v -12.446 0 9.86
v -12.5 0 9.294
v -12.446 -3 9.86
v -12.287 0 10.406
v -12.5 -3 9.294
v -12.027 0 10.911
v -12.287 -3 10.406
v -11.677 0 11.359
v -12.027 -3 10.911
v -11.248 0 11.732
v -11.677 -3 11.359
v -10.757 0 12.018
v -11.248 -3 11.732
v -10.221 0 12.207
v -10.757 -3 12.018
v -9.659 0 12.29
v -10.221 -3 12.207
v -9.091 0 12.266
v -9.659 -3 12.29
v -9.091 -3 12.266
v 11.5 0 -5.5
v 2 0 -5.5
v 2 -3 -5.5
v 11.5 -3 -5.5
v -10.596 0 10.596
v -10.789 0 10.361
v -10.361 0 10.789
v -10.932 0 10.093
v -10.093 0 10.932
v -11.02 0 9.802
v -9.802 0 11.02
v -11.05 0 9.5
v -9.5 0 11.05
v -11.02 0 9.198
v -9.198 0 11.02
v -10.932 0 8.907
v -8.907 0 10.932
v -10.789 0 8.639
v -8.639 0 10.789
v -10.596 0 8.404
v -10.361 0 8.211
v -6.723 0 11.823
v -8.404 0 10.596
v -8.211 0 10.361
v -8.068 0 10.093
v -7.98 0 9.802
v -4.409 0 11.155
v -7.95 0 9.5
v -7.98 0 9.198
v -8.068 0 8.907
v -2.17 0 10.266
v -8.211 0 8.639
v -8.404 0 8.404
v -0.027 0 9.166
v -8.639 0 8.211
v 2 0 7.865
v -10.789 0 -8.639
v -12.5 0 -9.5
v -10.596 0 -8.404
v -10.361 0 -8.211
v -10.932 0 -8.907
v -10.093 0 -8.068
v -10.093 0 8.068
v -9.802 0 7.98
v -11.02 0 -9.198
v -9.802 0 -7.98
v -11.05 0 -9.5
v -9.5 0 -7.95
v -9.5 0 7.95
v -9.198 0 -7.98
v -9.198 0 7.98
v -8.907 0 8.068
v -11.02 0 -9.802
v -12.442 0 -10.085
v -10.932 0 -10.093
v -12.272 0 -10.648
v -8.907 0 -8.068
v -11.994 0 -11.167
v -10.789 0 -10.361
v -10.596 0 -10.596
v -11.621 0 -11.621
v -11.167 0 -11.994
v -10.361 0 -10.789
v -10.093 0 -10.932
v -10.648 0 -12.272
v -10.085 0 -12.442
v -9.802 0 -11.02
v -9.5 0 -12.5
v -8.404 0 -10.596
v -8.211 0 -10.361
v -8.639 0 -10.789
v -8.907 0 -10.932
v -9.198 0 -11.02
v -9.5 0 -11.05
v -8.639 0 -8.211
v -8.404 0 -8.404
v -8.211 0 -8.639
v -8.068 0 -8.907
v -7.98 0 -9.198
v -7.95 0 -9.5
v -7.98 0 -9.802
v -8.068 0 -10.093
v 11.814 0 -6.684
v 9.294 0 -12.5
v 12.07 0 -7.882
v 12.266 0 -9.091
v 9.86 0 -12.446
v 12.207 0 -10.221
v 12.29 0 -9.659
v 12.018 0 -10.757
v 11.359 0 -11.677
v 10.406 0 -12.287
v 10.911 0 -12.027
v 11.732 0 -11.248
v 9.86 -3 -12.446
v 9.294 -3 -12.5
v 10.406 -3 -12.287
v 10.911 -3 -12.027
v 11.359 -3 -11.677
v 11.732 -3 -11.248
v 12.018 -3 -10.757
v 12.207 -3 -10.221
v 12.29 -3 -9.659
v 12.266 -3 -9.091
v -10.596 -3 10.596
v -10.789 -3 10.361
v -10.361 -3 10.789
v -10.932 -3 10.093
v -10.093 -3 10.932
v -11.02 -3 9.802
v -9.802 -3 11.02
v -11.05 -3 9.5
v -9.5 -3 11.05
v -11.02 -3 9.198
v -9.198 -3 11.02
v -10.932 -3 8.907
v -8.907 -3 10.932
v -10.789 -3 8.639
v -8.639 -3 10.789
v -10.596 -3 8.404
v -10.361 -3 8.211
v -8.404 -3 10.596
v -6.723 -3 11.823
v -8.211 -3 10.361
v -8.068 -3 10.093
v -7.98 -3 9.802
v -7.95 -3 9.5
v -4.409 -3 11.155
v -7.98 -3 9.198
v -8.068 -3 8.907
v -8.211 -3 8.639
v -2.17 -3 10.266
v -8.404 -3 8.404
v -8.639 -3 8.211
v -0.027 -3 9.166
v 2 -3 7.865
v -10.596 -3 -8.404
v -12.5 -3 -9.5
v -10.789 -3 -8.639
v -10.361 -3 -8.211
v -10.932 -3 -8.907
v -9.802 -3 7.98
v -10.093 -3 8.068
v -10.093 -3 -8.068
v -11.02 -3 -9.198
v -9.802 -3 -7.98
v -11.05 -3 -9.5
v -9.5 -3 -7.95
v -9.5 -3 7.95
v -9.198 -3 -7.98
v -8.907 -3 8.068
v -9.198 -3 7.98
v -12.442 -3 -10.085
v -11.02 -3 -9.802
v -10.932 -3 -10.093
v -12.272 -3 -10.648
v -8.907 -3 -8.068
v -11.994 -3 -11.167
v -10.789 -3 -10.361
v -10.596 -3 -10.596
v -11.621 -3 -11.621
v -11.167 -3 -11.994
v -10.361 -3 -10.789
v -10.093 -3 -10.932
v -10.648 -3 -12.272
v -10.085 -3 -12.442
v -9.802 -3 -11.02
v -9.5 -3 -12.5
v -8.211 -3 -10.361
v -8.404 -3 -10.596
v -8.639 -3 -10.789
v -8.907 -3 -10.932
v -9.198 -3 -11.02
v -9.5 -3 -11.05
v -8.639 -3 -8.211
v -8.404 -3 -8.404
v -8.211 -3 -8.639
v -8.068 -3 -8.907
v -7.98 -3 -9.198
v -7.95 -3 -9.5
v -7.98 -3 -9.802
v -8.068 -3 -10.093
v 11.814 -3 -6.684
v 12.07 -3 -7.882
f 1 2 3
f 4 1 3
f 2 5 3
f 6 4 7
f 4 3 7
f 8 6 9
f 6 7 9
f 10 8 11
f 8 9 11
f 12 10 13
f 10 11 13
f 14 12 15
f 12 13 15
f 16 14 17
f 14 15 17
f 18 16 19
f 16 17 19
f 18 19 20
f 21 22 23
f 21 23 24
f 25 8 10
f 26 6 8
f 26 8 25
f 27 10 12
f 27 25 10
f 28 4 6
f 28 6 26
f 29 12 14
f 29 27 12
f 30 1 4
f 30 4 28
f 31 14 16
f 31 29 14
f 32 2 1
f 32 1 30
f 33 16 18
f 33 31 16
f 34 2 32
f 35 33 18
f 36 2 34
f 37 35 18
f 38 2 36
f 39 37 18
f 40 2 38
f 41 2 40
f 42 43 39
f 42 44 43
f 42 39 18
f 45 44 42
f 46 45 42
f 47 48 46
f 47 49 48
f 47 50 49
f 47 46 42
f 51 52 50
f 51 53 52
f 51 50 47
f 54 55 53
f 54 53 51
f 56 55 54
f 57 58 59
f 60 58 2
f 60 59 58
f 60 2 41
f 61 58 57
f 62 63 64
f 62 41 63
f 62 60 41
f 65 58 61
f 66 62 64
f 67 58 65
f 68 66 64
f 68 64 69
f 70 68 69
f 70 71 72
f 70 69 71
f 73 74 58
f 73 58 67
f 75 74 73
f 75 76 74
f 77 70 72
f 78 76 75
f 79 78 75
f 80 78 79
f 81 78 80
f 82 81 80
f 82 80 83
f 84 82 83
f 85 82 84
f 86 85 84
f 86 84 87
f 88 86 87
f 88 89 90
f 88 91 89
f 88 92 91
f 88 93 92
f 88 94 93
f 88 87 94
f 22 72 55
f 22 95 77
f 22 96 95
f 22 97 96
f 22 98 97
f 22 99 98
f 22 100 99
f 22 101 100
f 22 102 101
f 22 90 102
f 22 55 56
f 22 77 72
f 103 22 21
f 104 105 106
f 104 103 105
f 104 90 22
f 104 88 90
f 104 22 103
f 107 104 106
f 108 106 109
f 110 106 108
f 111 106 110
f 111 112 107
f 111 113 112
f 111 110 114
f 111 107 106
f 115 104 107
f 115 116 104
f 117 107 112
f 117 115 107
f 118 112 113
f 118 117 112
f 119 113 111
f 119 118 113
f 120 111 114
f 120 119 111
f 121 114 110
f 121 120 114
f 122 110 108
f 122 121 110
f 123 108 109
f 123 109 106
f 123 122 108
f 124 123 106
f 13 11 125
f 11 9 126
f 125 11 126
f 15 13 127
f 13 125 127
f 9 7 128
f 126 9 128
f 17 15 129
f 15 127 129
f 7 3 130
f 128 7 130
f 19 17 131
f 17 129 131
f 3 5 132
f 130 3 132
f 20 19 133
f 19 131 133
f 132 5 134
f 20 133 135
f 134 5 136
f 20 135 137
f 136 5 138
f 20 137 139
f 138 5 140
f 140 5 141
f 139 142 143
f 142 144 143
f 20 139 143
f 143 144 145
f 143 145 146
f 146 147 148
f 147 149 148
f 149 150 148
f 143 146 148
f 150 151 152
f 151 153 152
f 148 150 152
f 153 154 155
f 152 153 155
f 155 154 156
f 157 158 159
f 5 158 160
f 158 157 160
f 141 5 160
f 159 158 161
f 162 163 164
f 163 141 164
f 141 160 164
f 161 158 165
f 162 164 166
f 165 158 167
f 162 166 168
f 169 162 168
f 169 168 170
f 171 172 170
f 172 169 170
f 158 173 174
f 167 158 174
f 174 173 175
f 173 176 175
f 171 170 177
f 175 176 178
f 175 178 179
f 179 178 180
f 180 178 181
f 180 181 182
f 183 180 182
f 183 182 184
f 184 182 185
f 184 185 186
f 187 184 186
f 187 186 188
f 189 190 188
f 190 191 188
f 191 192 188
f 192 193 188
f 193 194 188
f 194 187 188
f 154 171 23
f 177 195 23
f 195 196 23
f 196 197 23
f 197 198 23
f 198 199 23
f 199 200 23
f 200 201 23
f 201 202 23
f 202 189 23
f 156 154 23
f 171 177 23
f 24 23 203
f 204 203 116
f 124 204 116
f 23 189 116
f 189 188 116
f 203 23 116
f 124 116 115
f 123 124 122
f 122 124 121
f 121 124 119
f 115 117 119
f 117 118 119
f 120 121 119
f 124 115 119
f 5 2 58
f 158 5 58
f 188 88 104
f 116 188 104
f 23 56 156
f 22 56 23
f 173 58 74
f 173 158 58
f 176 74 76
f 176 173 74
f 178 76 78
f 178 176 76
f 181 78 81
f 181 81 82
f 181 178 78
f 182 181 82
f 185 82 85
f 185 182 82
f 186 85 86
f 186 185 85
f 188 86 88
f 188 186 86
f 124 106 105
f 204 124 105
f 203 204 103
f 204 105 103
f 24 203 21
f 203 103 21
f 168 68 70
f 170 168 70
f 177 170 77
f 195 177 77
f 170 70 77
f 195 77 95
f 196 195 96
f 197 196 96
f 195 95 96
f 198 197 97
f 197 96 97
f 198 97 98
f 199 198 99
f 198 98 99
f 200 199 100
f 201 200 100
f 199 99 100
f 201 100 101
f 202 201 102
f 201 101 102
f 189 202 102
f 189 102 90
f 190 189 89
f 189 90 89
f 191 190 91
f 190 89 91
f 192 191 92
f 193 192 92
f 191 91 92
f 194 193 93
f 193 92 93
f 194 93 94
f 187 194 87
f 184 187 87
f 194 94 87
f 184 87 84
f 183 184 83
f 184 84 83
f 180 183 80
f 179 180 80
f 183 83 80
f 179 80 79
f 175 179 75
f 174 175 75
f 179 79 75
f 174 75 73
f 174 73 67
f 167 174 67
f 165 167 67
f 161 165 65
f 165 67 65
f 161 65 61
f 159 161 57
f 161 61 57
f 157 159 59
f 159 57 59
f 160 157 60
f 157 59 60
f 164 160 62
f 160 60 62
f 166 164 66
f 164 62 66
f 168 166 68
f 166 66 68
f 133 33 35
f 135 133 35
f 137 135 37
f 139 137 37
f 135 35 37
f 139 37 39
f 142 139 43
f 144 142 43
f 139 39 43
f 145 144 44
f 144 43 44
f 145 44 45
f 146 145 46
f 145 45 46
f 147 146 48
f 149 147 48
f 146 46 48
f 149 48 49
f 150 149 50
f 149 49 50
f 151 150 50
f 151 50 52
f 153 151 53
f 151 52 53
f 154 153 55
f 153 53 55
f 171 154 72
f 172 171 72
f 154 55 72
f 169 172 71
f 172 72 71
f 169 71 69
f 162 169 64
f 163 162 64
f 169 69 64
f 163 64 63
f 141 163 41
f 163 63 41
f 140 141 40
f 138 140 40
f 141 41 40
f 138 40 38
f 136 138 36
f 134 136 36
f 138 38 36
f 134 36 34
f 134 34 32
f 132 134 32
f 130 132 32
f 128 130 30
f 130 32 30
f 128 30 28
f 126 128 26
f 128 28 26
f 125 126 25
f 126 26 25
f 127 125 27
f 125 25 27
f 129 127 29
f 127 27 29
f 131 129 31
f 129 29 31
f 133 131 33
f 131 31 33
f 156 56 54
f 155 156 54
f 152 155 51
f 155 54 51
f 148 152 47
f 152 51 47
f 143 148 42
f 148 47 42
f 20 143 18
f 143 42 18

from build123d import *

# Parameters (mm, degrees)
SKETCH1_W           = 25
SKETCH1_H           = 25
SKETCH1_R           = 1.55
BOSS_EXTRUDE1_DEPTH = 3
SKETCH2_W           = 10.5
SKETCH2_H           = 18
CUT_EXTRUDE1_DEPTH  = 18.930421077
CUT_EXTRUDE2_DEPTH  = 18.930421077
FILLET2_R           = 3


with BuildPart() as part:
    # Sketch1 → Boss-Extrude1 (new body)
    with BuildSketch(Plane(origin=(0, 0, 0), x_dir=(1, 0, 0), z_dir=(0, 1, 0))):
        Rectangle(SKETCH1_W, SKETCH1_H)
        with Locations(Location((-9.5, 9.5, 0), (0, 0, 270))):
            Circle(SKETCH1_R, mode=Mode.SUBTRACT)
        with Locations(Location((-9.5, -9.5, 0), (0, 0, 270))):
            Circle(SKETCH1_R, mode=Mode.SUBTRACT)
    extrude(amount=-BOSS_EXTRUDE1_DEPTH)

    # Sketch2 → Cut-Extrude1 (cut, through all)
    with BuildSketch(Plane(origin=(0, 0, 0), x_dir=(1, 0, 0), z_dir=(0, 1, 0))):
        with Locations((7.25, -3.5)):
            Rectangle(SKETCH2_W, SKETCH2_H)
    extrude(amount=-CUT_EXTRUDE1_DEPTH, mode=Mode.SUBTRACT)

    # Sketch3 → Cut-Extrude2 (cut, through all)
    with BuildSketch(Plane(origin=(0, 0, 0), x_dir=(1, 0, 0), z_dir=(0, 1, 0))):
        with BuildLine():
            Line((-12.5, -12.5), (12.5, -12.5))
            Line((12.5, -12.5), (12.5, 12.5))
            ThreePointArc((12.5, 12.5), (5.17766953, -5.17766953), (-12.5, -12.5))
        make_face()
    extrude(amount=-CUT_EXTRUDE2_DEPTH, mode=Mode.SUBTRACT)

    # Fillet2
    fillet2_edges = [part.edges().sort_by_distance(p)[0] for p in [
        (-12.5, -1.5, 12.5),
        (-12.5, -1.5, -12.5),
        (12.5, -1.5, -12.5),
    ]]
    fillet(fillet2_edges, radius=FILLET2_R)


solid = part.part
